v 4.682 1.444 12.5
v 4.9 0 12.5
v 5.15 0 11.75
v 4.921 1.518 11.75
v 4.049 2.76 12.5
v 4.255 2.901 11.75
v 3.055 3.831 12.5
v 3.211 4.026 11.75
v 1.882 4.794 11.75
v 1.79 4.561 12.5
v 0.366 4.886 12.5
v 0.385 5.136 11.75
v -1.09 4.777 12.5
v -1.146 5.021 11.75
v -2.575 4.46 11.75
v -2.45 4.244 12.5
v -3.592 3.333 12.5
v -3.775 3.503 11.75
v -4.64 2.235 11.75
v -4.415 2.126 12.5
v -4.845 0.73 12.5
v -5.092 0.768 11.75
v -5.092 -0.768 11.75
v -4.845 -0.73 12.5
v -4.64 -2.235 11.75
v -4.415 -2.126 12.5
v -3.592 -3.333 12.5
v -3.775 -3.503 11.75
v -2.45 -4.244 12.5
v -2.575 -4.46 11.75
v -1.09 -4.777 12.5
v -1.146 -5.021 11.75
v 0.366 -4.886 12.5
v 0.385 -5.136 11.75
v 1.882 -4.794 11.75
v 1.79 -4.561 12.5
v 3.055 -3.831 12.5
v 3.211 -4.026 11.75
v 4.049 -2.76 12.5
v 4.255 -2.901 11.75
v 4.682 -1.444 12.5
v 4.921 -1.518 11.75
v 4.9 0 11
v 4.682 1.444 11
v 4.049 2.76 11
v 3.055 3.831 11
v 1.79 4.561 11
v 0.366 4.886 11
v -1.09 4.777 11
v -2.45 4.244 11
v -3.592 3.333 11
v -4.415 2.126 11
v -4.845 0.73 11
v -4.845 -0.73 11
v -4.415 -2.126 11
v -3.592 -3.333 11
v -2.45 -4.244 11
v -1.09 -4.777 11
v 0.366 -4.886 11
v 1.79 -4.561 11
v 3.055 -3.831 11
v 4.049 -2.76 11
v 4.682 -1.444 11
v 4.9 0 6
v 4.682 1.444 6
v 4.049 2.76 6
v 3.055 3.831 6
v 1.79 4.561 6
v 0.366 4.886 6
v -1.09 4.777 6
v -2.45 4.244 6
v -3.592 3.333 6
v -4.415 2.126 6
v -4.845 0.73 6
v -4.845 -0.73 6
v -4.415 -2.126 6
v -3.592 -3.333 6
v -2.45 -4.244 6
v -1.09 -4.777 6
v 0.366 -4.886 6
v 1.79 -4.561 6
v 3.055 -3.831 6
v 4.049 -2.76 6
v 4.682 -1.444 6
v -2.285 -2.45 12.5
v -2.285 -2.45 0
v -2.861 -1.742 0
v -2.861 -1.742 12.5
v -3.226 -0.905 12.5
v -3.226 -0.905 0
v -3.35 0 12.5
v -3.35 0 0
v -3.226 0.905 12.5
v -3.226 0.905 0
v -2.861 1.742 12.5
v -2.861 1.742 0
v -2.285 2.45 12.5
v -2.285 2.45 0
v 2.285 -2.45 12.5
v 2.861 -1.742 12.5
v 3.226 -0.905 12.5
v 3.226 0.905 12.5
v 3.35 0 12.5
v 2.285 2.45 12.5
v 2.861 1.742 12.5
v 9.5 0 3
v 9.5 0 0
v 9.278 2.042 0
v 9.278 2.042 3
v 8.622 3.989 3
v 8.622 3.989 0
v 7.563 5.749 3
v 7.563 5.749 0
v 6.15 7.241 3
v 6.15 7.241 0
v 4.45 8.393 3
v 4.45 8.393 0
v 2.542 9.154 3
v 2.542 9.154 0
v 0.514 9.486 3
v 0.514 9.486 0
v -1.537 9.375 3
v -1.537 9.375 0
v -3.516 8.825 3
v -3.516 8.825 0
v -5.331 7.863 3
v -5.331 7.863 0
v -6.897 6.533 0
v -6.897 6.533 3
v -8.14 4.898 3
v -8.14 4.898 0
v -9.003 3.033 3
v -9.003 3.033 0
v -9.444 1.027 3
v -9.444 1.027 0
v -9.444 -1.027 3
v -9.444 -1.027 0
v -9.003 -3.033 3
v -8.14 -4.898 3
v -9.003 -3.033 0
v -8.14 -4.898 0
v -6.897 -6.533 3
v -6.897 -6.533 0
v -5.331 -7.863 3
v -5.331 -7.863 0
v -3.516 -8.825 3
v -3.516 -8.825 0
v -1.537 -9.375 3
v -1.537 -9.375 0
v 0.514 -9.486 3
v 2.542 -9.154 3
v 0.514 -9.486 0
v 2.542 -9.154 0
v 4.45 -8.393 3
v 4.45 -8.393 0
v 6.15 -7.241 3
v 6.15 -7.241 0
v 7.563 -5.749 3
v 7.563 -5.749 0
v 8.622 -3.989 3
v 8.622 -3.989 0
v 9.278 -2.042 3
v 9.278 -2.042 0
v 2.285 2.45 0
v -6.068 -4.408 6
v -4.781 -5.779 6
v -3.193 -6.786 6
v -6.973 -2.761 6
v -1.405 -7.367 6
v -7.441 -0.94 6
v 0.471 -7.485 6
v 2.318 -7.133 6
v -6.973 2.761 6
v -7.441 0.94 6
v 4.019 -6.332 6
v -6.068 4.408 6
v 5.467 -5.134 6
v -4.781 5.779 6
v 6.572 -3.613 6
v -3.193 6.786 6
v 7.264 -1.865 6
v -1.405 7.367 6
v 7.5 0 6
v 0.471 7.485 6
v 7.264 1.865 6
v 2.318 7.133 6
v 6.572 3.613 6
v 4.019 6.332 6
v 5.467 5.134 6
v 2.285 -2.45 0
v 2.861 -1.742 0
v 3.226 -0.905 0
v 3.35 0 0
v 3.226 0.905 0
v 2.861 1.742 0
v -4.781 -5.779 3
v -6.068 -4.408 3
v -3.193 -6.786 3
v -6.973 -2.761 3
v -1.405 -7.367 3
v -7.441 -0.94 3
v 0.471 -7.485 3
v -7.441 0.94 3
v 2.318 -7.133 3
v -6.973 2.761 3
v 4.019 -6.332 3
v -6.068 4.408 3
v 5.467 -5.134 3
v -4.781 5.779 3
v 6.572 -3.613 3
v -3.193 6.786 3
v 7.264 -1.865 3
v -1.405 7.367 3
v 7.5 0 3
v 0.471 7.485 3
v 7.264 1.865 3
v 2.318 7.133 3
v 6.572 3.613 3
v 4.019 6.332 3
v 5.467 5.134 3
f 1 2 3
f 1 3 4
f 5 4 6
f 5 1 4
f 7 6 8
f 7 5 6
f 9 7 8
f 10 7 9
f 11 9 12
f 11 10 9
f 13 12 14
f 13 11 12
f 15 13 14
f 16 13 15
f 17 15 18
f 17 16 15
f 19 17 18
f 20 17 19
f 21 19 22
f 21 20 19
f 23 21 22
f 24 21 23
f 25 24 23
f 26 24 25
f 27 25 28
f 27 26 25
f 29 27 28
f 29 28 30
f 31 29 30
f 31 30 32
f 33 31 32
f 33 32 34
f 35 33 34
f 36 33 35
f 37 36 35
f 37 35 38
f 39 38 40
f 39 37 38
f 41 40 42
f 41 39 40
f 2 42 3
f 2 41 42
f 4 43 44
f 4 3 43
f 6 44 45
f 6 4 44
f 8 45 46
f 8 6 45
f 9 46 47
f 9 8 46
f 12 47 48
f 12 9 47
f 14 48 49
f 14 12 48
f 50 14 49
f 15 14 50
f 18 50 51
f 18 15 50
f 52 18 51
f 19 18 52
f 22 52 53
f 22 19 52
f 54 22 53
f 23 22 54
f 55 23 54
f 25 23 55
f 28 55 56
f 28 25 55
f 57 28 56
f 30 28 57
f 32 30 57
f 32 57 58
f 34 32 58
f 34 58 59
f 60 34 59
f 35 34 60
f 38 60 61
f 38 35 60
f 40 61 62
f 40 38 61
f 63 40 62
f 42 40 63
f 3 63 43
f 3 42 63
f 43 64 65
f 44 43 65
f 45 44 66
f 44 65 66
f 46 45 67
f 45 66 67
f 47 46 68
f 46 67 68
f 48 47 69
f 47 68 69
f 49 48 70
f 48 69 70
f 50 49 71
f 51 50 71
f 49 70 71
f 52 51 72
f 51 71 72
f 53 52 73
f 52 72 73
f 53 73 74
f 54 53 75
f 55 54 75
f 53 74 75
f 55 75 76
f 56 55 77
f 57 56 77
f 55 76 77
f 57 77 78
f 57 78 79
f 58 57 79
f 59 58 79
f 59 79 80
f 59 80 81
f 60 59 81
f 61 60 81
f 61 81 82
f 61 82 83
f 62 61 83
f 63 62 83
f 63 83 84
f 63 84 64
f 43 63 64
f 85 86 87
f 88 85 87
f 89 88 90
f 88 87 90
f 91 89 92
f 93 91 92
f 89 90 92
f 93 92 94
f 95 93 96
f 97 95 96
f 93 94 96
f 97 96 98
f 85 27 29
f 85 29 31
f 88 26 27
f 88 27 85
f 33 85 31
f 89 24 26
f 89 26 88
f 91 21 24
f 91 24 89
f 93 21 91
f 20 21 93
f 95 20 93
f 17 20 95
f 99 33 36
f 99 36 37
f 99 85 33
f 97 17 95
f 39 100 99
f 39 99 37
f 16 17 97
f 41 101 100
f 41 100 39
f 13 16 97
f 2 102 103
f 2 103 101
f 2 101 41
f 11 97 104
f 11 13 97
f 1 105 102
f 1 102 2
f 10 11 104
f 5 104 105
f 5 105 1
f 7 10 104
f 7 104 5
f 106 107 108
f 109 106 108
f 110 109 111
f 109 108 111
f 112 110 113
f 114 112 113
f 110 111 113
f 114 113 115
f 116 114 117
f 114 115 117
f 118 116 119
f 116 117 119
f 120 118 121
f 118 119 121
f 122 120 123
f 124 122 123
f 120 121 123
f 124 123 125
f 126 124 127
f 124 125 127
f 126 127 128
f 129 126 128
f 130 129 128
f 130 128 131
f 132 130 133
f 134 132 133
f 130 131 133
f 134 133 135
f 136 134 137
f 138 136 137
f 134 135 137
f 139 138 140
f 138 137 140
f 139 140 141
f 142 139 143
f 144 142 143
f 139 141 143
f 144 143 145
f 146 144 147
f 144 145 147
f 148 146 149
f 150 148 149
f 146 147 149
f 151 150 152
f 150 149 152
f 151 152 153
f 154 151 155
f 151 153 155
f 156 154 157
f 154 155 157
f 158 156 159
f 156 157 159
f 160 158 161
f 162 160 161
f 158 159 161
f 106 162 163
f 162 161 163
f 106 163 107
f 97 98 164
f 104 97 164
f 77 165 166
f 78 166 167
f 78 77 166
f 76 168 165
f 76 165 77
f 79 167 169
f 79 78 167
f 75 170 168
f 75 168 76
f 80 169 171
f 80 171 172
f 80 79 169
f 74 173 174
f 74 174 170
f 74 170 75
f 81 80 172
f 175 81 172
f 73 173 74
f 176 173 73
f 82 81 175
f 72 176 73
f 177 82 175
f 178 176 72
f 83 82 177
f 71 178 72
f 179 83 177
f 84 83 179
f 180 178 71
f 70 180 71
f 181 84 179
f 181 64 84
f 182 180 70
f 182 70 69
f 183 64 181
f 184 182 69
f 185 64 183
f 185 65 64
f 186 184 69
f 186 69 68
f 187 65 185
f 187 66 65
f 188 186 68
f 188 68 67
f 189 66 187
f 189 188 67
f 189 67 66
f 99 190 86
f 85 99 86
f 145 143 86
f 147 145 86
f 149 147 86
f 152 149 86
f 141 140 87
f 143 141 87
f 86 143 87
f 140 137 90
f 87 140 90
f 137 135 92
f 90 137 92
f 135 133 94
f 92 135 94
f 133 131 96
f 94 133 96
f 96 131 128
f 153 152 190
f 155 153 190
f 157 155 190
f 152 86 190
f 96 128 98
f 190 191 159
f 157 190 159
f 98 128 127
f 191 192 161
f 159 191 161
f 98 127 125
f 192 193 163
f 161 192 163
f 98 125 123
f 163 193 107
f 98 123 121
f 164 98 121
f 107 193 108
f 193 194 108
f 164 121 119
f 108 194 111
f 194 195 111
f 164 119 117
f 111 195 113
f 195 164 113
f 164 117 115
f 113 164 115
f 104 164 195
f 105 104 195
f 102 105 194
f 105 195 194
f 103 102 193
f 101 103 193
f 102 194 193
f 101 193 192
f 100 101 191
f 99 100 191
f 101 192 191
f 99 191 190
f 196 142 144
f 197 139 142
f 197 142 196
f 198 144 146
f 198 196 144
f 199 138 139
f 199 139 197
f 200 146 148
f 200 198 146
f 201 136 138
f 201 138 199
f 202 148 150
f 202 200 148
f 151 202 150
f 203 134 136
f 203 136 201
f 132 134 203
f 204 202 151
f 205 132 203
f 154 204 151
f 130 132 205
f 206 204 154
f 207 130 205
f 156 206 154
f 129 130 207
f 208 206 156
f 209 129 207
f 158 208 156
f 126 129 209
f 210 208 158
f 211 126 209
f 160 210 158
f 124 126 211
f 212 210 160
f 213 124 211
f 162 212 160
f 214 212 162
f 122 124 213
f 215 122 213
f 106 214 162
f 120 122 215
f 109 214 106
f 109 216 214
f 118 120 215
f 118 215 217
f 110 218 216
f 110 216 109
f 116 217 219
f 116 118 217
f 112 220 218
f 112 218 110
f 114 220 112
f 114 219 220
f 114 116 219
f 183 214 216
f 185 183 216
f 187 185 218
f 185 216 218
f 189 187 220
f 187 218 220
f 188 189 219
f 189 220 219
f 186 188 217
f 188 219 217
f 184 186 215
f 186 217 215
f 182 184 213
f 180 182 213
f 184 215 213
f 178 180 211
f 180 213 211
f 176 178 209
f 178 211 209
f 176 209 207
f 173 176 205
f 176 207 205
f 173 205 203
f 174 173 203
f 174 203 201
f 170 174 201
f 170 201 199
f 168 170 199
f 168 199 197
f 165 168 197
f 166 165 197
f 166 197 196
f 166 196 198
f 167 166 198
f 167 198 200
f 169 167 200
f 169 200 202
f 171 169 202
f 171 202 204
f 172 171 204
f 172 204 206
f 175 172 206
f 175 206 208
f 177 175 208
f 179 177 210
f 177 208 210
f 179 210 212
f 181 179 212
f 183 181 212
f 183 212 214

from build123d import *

# Parameters (mm, degrees)
F3_R     = 9.5
F3_R_2   = 7.5
F3_R_3   = 4.9
F4_DEPTH = 3
F5_DEPTH = 6
F6_DEPTH = 12.5


with BuildPart() as f4:
    # F3 (on Top) → F4 (new body)
    with BuildSketch(Plane.XY):
        Circle(F3_R)
        Circle(F3_R_2, mode=Mode.SUBTRACT)
        Circle(F3_R_2)
        Circle(F3_R_3, mode=Mode.SUBTRACT)
        Circle(F3_R_3)
        with BuildLine():
            ThreePointArc((-2.2847319318, -2.45), (-3.35, 0), (-2.2847319318, 2.45))
            Line((-2.2847319318, 2.45), (2.2847319318, 2.45))
            ThreePointArc((2.2847319318, 2.45), (3.35, 0), (2.2847319318, -2.45))
            Line((2.2847319318, -2.45), (-2.2847319318, -2.45))
        make_face(mode=Mode.SUBTRACT)
    extrude(amount=F4_DEPTH)

    # F3 (on Top) → F5 (join)
    with BuildSketch(Plane.XY):
        Circle(F3_R_2)
        Circle(F3_R_3, mode=Mode.SUBTRACT)
        Circle(F3_R_3)
        with BuildLine():
            ThreePointArc((-2.2847319318, -2.45), (-3.35, 0), (-2.2847319318, 2.45))
            Line((-2.2847319318, 2.45), (2.2847319318, 2.45))
            ThreePointArc((2.2847319318, 2.45), (3.35, 0), (2.2847319318, -2.45))
            Line((2.2847319318, -2.45), (-2.2847319318, -2.45))
        make_face(mode=Mode.SUBTRACT)
    extrude(amount=F5_DEPTH)

    # F3 (on Top) → F6 (join)
    with BuildSketch(Plane.XY):
        Circle(F3_R_3)
        with BuildLine():
            ThreePointArc((-2.2847319318, -2.45), (-3.35, 0), (-2.2847319318, 2.45))
            Line((-2.2847319318, 2.45), (2.2847319318, 2.45))
            ThreePointArc((2.2847319318, 2.45), (3.35, 0), (2.2847319318, -2.45))
            Line((2.2847319318, -2.45), (-2.2847319318, -2.45))
        make_face(mode=Mode.SUBTRACT)
    extrude(amount=F6_DEPTH)

    # F7 (on Front) → F8 (revolve)
    with BuildSketch(Plane.XZ):
        Polygon((5.15, 11.75), (4.9, 12.5), (4.9, 11), align=None)
    revolve(axis=Axis((0, 0, 8.7542282417), (0, 0, 1)))


solid = f4.part
